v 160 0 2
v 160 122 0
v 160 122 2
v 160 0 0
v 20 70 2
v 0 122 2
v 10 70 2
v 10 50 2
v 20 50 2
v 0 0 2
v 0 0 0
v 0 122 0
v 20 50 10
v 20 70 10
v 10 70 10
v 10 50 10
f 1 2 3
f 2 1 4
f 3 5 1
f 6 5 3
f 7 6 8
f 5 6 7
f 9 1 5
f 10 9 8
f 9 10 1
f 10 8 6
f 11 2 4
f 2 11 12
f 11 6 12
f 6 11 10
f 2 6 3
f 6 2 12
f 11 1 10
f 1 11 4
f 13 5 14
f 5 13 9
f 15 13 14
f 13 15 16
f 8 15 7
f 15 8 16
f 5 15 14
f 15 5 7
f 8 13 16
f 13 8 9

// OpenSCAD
translate([0,0,0]) cube([160,122,2]);
translate([10,50,0]) cube([10,20,10]);
